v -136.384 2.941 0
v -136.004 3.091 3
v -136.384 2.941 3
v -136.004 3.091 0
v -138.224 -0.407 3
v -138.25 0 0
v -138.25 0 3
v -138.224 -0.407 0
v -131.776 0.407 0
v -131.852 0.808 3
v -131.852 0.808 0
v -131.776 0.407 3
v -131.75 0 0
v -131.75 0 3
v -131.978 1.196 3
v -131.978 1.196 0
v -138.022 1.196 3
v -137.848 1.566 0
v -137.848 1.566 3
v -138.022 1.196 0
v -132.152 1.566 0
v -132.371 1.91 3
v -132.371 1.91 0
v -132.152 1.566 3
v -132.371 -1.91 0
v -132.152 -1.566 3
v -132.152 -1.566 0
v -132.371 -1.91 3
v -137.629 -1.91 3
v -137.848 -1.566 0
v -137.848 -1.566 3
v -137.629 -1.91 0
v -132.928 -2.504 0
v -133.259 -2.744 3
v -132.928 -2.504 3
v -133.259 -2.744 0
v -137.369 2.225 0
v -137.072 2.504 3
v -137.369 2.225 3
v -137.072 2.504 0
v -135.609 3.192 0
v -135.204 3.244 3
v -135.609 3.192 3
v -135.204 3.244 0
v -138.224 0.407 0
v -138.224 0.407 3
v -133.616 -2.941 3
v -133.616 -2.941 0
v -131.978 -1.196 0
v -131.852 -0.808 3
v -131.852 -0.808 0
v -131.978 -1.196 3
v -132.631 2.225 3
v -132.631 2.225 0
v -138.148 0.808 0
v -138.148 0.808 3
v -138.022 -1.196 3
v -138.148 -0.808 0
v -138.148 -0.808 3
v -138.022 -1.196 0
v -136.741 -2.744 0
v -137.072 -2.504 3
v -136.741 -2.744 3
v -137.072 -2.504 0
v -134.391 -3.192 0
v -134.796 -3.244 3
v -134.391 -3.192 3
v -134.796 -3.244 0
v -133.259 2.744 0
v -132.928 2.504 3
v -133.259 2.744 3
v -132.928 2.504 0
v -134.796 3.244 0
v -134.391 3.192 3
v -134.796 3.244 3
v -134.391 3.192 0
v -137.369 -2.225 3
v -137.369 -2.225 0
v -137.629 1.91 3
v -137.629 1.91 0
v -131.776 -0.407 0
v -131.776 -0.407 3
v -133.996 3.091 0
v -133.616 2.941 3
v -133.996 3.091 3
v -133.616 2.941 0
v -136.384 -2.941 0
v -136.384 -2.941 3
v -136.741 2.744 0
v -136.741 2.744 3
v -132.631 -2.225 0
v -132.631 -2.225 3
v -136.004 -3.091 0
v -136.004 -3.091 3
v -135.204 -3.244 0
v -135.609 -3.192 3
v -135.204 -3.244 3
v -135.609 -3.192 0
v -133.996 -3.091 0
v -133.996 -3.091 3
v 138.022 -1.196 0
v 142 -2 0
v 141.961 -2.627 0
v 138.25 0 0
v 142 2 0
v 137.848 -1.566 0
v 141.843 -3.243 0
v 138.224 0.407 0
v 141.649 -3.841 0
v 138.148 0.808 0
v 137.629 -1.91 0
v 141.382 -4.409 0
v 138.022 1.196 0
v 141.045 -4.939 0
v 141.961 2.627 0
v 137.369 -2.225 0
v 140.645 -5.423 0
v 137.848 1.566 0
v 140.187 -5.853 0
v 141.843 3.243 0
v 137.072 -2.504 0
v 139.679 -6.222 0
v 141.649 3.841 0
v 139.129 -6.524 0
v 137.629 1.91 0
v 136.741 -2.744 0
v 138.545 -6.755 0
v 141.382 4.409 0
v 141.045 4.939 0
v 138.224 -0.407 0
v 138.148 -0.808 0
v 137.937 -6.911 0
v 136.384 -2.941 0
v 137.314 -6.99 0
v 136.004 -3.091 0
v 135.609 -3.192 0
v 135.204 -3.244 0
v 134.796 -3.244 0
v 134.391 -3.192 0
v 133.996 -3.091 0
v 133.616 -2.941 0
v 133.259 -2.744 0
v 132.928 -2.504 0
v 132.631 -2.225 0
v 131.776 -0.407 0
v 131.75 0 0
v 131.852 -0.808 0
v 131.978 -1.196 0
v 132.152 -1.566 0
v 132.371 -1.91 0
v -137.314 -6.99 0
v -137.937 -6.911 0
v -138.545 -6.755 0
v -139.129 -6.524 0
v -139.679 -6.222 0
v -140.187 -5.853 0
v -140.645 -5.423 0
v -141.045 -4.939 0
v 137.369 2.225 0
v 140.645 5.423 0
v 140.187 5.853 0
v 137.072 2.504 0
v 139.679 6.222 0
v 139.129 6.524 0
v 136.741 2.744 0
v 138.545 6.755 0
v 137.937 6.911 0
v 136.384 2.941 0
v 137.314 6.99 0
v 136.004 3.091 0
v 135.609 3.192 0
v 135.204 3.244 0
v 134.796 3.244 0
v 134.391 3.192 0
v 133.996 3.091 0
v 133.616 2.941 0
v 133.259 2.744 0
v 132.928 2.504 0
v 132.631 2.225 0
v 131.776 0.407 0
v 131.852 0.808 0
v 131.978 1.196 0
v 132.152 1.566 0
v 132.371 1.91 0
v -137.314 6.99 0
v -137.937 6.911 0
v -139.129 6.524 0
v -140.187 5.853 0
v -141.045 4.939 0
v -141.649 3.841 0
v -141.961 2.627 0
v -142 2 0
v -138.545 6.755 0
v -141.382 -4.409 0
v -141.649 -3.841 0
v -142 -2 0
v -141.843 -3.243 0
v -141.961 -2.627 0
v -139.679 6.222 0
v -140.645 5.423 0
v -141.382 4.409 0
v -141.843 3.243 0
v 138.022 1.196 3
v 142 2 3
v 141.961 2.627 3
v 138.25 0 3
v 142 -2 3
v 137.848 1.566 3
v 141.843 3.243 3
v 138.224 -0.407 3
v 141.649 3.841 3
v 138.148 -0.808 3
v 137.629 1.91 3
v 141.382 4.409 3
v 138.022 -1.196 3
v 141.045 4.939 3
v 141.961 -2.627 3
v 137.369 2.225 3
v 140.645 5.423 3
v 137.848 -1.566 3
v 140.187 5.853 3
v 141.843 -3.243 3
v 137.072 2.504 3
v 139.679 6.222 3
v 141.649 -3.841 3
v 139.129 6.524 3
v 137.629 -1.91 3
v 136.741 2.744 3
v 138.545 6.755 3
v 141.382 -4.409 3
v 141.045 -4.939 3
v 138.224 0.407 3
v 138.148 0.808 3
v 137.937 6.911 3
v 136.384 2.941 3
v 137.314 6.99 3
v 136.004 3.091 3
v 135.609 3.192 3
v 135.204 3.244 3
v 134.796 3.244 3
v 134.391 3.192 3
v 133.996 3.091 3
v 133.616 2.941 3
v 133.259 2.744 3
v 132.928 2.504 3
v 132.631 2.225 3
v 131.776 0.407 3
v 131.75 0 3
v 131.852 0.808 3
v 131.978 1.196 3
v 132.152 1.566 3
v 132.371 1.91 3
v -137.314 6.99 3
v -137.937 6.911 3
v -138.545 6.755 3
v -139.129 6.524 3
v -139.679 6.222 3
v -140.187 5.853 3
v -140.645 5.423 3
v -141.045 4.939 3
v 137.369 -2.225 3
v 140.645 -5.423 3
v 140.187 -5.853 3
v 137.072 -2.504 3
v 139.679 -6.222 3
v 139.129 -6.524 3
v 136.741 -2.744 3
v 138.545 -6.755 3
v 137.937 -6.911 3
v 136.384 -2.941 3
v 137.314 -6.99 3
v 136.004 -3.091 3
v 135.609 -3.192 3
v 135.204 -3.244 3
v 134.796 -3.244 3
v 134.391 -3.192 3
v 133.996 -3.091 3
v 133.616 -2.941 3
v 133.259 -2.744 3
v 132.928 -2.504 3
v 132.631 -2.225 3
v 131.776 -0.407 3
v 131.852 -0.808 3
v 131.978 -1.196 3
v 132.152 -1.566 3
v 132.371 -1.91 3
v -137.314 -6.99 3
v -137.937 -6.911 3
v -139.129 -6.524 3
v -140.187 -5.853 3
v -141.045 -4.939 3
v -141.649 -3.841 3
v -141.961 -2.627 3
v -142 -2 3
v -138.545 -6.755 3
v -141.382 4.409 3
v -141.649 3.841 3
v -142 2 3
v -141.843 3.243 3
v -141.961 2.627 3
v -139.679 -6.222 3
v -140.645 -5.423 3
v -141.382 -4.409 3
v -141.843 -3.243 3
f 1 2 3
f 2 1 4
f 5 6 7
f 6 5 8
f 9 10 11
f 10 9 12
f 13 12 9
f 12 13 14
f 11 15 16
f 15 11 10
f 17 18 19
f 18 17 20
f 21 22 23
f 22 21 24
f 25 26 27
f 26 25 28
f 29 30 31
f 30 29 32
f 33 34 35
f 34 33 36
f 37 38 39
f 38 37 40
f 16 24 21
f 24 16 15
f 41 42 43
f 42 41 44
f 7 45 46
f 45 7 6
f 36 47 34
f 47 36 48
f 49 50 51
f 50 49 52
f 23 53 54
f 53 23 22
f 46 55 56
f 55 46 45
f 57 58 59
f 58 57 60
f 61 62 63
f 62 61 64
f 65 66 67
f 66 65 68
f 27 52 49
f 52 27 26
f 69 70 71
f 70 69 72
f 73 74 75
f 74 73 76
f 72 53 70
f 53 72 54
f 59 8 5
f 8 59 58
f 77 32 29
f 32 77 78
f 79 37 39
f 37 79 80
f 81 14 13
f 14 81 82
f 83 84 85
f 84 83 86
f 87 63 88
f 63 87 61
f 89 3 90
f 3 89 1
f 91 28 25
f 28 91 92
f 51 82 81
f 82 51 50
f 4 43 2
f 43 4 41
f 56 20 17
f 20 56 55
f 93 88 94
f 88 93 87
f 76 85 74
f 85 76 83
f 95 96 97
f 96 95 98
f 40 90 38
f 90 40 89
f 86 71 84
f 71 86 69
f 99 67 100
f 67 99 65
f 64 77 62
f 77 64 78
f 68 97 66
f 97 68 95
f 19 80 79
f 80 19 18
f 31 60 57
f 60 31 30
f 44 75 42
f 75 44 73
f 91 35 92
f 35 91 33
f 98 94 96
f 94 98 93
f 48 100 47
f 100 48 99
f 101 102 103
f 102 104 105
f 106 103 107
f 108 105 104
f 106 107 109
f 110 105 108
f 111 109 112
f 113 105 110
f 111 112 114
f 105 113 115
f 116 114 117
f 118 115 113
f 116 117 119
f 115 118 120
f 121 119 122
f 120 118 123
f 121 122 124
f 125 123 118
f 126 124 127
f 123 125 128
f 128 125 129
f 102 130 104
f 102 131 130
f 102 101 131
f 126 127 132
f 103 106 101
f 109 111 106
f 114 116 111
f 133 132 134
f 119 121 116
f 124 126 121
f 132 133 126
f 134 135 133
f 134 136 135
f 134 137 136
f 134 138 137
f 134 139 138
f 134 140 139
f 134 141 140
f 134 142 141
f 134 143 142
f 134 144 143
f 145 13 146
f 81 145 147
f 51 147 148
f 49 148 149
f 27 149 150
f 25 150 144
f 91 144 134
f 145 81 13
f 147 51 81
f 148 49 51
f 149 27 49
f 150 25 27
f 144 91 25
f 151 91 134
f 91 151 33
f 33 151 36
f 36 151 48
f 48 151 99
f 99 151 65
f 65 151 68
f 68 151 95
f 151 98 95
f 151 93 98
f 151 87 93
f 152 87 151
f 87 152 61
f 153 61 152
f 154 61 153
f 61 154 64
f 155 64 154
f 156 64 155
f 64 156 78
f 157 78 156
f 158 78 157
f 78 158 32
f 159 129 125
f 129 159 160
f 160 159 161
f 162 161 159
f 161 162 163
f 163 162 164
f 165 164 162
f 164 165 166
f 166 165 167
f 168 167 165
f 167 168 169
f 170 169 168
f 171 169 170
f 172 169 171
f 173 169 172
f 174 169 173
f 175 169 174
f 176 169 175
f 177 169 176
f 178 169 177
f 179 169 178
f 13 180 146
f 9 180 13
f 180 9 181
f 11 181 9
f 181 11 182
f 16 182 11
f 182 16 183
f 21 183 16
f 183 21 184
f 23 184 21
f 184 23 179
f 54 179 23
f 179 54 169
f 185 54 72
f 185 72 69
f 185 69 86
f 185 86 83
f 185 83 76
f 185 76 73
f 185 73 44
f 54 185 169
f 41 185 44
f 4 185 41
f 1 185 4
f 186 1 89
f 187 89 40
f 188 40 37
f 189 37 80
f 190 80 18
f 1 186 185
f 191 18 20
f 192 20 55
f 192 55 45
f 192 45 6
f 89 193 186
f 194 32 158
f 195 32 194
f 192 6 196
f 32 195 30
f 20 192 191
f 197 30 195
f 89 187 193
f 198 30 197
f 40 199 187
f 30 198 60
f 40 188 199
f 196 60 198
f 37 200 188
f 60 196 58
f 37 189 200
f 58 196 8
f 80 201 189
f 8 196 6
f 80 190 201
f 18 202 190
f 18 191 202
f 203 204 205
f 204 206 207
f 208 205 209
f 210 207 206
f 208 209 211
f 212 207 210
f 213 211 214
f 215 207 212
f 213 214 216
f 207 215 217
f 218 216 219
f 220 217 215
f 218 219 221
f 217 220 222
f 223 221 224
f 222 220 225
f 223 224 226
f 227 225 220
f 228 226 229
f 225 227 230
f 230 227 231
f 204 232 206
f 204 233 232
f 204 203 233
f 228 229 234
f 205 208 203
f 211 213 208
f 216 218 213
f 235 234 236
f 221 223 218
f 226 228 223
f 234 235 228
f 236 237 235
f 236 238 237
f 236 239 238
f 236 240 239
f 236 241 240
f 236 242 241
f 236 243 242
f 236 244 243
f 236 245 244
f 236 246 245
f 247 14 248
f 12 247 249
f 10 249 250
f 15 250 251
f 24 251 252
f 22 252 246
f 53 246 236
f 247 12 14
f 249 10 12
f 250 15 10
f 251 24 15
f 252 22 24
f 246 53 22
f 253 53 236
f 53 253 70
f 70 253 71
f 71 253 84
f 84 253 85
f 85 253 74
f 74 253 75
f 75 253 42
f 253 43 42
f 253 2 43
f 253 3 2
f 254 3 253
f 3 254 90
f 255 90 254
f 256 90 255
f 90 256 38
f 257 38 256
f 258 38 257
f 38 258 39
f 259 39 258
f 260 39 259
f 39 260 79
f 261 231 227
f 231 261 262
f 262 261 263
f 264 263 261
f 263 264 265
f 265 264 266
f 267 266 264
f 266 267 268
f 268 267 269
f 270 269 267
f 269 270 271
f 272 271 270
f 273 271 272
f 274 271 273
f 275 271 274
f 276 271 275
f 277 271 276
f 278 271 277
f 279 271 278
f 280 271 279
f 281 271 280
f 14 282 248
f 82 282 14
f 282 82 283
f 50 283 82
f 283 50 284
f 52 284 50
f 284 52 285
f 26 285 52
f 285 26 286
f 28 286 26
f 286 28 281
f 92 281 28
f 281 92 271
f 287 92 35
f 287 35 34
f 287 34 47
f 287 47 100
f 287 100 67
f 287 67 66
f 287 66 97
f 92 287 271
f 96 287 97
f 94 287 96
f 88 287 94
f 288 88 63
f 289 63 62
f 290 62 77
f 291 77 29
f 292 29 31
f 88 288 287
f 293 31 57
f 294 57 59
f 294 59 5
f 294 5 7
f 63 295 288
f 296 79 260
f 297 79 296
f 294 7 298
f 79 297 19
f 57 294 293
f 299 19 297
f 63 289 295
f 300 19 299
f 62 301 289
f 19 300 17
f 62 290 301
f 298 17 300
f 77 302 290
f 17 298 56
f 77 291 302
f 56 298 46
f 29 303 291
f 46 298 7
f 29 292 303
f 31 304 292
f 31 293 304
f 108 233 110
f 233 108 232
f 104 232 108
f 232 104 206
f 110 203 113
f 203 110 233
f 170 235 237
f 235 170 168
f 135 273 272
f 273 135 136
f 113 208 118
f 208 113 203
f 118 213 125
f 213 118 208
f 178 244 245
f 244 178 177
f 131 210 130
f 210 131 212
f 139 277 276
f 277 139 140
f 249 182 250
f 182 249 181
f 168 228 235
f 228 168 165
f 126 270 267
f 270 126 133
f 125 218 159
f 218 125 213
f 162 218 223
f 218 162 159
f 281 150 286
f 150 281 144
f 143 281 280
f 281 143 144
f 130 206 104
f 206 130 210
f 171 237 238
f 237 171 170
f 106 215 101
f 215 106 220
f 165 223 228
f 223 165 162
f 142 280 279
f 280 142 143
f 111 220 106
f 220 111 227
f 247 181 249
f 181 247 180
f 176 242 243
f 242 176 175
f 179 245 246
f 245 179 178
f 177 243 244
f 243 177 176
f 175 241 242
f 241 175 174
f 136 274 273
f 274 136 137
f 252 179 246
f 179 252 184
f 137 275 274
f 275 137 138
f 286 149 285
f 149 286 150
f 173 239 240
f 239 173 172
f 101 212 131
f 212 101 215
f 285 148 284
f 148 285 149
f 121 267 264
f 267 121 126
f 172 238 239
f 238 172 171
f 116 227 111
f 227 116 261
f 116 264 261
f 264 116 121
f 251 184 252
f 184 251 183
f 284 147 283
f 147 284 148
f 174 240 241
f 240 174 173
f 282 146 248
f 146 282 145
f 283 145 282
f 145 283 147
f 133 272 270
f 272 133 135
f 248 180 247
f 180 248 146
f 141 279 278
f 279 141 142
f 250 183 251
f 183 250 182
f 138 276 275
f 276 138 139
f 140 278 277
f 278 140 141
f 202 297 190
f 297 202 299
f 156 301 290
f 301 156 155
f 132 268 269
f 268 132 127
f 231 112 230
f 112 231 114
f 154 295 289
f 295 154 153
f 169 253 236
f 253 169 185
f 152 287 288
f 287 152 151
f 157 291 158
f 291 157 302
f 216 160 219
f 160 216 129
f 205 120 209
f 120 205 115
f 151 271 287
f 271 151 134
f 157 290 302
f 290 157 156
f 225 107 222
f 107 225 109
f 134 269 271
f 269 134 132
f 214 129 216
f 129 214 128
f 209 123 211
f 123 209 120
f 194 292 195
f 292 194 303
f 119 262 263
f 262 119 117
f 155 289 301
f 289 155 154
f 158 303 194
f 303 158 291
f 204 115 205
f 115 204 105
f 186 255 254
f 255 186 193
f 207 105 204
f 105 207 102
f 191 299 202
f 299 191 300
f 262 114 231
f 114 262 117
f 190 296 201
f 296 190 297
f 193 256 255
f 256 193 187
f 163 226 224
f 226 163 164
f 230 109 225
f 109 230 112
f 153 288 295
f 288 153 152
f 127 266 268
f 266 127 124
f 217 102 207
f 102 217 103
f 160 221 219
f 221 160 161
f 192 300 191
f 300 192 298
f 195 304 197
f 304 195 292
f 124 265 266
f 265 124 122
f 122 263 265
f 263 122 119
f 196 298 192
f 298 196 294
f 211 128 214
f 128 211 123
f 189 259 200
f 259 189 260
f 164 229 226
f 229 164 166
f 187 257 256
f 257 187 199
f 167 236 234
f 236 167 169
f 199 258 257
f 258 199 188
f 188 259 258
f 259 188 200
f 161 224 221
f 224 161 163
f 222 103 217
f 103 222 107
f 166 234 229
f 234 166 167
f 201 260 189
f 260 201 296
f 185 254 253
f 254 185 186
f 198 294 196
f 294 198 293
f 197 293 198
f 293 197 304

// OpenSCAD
$fn = 50;


difference() {
	union() {
		hull() {
			translate(v = [-137.0000000000, 2.0000000000, 0]) {
				cylinder(h = 3, r = 5);
			}
			translate(v = [137.0000000000, 2.0000000000, 0]) {
				cylinder(h = 3, r = 5);
			}
			translate(v = [-137.0000000000, -2.0000000000, 0]) {
				cylinder(h = 3, r = 5);
			}
			translate(v = [137.0000000000, -2.0000000000, 0]) {
				cylinder(h = 3, r = 5);
			}
		}
	}
	union() {
		translate(v = [-135.0000000000, 0.0000000000, 0]) {
			cylinder(h = 3, r = 3.2500000000);
		}
		translate(v = [135.0000000000, 0.0000000000, 0]) {
			cylinder(h = 3, r = 3.2500000000);
		}
		translate(v = [-135.0000000000, 0.0000000000, 0]) {
			cylinder(h = 3, r = 1.8000000000);
		}
		translate(v = [135.0000000000, 0.0000000000, 0]) {
			cylinder(h = 3, r = 1.8000000000);
		}
		translate(v = [-135.0000000000, 0.0000000000, 0]) {
			cylinder(h = 3, r = 1.8000000000);
		}
		translate(v = [135.0000000000, 0.0000000000, 0]) {
			cylinder(h = 3, r = 1.8000000000);
		}
		translate(v = [-135.0000000000, 0.0000000000, 0]) {
			cylinder(h = 3, r = 1.8000000000);
		}
		translate(v = [135.0000000000, 0.0000000000, 0]) {
			cylinder(h = 3, r = 1.8000000000);
		}
	}
}
